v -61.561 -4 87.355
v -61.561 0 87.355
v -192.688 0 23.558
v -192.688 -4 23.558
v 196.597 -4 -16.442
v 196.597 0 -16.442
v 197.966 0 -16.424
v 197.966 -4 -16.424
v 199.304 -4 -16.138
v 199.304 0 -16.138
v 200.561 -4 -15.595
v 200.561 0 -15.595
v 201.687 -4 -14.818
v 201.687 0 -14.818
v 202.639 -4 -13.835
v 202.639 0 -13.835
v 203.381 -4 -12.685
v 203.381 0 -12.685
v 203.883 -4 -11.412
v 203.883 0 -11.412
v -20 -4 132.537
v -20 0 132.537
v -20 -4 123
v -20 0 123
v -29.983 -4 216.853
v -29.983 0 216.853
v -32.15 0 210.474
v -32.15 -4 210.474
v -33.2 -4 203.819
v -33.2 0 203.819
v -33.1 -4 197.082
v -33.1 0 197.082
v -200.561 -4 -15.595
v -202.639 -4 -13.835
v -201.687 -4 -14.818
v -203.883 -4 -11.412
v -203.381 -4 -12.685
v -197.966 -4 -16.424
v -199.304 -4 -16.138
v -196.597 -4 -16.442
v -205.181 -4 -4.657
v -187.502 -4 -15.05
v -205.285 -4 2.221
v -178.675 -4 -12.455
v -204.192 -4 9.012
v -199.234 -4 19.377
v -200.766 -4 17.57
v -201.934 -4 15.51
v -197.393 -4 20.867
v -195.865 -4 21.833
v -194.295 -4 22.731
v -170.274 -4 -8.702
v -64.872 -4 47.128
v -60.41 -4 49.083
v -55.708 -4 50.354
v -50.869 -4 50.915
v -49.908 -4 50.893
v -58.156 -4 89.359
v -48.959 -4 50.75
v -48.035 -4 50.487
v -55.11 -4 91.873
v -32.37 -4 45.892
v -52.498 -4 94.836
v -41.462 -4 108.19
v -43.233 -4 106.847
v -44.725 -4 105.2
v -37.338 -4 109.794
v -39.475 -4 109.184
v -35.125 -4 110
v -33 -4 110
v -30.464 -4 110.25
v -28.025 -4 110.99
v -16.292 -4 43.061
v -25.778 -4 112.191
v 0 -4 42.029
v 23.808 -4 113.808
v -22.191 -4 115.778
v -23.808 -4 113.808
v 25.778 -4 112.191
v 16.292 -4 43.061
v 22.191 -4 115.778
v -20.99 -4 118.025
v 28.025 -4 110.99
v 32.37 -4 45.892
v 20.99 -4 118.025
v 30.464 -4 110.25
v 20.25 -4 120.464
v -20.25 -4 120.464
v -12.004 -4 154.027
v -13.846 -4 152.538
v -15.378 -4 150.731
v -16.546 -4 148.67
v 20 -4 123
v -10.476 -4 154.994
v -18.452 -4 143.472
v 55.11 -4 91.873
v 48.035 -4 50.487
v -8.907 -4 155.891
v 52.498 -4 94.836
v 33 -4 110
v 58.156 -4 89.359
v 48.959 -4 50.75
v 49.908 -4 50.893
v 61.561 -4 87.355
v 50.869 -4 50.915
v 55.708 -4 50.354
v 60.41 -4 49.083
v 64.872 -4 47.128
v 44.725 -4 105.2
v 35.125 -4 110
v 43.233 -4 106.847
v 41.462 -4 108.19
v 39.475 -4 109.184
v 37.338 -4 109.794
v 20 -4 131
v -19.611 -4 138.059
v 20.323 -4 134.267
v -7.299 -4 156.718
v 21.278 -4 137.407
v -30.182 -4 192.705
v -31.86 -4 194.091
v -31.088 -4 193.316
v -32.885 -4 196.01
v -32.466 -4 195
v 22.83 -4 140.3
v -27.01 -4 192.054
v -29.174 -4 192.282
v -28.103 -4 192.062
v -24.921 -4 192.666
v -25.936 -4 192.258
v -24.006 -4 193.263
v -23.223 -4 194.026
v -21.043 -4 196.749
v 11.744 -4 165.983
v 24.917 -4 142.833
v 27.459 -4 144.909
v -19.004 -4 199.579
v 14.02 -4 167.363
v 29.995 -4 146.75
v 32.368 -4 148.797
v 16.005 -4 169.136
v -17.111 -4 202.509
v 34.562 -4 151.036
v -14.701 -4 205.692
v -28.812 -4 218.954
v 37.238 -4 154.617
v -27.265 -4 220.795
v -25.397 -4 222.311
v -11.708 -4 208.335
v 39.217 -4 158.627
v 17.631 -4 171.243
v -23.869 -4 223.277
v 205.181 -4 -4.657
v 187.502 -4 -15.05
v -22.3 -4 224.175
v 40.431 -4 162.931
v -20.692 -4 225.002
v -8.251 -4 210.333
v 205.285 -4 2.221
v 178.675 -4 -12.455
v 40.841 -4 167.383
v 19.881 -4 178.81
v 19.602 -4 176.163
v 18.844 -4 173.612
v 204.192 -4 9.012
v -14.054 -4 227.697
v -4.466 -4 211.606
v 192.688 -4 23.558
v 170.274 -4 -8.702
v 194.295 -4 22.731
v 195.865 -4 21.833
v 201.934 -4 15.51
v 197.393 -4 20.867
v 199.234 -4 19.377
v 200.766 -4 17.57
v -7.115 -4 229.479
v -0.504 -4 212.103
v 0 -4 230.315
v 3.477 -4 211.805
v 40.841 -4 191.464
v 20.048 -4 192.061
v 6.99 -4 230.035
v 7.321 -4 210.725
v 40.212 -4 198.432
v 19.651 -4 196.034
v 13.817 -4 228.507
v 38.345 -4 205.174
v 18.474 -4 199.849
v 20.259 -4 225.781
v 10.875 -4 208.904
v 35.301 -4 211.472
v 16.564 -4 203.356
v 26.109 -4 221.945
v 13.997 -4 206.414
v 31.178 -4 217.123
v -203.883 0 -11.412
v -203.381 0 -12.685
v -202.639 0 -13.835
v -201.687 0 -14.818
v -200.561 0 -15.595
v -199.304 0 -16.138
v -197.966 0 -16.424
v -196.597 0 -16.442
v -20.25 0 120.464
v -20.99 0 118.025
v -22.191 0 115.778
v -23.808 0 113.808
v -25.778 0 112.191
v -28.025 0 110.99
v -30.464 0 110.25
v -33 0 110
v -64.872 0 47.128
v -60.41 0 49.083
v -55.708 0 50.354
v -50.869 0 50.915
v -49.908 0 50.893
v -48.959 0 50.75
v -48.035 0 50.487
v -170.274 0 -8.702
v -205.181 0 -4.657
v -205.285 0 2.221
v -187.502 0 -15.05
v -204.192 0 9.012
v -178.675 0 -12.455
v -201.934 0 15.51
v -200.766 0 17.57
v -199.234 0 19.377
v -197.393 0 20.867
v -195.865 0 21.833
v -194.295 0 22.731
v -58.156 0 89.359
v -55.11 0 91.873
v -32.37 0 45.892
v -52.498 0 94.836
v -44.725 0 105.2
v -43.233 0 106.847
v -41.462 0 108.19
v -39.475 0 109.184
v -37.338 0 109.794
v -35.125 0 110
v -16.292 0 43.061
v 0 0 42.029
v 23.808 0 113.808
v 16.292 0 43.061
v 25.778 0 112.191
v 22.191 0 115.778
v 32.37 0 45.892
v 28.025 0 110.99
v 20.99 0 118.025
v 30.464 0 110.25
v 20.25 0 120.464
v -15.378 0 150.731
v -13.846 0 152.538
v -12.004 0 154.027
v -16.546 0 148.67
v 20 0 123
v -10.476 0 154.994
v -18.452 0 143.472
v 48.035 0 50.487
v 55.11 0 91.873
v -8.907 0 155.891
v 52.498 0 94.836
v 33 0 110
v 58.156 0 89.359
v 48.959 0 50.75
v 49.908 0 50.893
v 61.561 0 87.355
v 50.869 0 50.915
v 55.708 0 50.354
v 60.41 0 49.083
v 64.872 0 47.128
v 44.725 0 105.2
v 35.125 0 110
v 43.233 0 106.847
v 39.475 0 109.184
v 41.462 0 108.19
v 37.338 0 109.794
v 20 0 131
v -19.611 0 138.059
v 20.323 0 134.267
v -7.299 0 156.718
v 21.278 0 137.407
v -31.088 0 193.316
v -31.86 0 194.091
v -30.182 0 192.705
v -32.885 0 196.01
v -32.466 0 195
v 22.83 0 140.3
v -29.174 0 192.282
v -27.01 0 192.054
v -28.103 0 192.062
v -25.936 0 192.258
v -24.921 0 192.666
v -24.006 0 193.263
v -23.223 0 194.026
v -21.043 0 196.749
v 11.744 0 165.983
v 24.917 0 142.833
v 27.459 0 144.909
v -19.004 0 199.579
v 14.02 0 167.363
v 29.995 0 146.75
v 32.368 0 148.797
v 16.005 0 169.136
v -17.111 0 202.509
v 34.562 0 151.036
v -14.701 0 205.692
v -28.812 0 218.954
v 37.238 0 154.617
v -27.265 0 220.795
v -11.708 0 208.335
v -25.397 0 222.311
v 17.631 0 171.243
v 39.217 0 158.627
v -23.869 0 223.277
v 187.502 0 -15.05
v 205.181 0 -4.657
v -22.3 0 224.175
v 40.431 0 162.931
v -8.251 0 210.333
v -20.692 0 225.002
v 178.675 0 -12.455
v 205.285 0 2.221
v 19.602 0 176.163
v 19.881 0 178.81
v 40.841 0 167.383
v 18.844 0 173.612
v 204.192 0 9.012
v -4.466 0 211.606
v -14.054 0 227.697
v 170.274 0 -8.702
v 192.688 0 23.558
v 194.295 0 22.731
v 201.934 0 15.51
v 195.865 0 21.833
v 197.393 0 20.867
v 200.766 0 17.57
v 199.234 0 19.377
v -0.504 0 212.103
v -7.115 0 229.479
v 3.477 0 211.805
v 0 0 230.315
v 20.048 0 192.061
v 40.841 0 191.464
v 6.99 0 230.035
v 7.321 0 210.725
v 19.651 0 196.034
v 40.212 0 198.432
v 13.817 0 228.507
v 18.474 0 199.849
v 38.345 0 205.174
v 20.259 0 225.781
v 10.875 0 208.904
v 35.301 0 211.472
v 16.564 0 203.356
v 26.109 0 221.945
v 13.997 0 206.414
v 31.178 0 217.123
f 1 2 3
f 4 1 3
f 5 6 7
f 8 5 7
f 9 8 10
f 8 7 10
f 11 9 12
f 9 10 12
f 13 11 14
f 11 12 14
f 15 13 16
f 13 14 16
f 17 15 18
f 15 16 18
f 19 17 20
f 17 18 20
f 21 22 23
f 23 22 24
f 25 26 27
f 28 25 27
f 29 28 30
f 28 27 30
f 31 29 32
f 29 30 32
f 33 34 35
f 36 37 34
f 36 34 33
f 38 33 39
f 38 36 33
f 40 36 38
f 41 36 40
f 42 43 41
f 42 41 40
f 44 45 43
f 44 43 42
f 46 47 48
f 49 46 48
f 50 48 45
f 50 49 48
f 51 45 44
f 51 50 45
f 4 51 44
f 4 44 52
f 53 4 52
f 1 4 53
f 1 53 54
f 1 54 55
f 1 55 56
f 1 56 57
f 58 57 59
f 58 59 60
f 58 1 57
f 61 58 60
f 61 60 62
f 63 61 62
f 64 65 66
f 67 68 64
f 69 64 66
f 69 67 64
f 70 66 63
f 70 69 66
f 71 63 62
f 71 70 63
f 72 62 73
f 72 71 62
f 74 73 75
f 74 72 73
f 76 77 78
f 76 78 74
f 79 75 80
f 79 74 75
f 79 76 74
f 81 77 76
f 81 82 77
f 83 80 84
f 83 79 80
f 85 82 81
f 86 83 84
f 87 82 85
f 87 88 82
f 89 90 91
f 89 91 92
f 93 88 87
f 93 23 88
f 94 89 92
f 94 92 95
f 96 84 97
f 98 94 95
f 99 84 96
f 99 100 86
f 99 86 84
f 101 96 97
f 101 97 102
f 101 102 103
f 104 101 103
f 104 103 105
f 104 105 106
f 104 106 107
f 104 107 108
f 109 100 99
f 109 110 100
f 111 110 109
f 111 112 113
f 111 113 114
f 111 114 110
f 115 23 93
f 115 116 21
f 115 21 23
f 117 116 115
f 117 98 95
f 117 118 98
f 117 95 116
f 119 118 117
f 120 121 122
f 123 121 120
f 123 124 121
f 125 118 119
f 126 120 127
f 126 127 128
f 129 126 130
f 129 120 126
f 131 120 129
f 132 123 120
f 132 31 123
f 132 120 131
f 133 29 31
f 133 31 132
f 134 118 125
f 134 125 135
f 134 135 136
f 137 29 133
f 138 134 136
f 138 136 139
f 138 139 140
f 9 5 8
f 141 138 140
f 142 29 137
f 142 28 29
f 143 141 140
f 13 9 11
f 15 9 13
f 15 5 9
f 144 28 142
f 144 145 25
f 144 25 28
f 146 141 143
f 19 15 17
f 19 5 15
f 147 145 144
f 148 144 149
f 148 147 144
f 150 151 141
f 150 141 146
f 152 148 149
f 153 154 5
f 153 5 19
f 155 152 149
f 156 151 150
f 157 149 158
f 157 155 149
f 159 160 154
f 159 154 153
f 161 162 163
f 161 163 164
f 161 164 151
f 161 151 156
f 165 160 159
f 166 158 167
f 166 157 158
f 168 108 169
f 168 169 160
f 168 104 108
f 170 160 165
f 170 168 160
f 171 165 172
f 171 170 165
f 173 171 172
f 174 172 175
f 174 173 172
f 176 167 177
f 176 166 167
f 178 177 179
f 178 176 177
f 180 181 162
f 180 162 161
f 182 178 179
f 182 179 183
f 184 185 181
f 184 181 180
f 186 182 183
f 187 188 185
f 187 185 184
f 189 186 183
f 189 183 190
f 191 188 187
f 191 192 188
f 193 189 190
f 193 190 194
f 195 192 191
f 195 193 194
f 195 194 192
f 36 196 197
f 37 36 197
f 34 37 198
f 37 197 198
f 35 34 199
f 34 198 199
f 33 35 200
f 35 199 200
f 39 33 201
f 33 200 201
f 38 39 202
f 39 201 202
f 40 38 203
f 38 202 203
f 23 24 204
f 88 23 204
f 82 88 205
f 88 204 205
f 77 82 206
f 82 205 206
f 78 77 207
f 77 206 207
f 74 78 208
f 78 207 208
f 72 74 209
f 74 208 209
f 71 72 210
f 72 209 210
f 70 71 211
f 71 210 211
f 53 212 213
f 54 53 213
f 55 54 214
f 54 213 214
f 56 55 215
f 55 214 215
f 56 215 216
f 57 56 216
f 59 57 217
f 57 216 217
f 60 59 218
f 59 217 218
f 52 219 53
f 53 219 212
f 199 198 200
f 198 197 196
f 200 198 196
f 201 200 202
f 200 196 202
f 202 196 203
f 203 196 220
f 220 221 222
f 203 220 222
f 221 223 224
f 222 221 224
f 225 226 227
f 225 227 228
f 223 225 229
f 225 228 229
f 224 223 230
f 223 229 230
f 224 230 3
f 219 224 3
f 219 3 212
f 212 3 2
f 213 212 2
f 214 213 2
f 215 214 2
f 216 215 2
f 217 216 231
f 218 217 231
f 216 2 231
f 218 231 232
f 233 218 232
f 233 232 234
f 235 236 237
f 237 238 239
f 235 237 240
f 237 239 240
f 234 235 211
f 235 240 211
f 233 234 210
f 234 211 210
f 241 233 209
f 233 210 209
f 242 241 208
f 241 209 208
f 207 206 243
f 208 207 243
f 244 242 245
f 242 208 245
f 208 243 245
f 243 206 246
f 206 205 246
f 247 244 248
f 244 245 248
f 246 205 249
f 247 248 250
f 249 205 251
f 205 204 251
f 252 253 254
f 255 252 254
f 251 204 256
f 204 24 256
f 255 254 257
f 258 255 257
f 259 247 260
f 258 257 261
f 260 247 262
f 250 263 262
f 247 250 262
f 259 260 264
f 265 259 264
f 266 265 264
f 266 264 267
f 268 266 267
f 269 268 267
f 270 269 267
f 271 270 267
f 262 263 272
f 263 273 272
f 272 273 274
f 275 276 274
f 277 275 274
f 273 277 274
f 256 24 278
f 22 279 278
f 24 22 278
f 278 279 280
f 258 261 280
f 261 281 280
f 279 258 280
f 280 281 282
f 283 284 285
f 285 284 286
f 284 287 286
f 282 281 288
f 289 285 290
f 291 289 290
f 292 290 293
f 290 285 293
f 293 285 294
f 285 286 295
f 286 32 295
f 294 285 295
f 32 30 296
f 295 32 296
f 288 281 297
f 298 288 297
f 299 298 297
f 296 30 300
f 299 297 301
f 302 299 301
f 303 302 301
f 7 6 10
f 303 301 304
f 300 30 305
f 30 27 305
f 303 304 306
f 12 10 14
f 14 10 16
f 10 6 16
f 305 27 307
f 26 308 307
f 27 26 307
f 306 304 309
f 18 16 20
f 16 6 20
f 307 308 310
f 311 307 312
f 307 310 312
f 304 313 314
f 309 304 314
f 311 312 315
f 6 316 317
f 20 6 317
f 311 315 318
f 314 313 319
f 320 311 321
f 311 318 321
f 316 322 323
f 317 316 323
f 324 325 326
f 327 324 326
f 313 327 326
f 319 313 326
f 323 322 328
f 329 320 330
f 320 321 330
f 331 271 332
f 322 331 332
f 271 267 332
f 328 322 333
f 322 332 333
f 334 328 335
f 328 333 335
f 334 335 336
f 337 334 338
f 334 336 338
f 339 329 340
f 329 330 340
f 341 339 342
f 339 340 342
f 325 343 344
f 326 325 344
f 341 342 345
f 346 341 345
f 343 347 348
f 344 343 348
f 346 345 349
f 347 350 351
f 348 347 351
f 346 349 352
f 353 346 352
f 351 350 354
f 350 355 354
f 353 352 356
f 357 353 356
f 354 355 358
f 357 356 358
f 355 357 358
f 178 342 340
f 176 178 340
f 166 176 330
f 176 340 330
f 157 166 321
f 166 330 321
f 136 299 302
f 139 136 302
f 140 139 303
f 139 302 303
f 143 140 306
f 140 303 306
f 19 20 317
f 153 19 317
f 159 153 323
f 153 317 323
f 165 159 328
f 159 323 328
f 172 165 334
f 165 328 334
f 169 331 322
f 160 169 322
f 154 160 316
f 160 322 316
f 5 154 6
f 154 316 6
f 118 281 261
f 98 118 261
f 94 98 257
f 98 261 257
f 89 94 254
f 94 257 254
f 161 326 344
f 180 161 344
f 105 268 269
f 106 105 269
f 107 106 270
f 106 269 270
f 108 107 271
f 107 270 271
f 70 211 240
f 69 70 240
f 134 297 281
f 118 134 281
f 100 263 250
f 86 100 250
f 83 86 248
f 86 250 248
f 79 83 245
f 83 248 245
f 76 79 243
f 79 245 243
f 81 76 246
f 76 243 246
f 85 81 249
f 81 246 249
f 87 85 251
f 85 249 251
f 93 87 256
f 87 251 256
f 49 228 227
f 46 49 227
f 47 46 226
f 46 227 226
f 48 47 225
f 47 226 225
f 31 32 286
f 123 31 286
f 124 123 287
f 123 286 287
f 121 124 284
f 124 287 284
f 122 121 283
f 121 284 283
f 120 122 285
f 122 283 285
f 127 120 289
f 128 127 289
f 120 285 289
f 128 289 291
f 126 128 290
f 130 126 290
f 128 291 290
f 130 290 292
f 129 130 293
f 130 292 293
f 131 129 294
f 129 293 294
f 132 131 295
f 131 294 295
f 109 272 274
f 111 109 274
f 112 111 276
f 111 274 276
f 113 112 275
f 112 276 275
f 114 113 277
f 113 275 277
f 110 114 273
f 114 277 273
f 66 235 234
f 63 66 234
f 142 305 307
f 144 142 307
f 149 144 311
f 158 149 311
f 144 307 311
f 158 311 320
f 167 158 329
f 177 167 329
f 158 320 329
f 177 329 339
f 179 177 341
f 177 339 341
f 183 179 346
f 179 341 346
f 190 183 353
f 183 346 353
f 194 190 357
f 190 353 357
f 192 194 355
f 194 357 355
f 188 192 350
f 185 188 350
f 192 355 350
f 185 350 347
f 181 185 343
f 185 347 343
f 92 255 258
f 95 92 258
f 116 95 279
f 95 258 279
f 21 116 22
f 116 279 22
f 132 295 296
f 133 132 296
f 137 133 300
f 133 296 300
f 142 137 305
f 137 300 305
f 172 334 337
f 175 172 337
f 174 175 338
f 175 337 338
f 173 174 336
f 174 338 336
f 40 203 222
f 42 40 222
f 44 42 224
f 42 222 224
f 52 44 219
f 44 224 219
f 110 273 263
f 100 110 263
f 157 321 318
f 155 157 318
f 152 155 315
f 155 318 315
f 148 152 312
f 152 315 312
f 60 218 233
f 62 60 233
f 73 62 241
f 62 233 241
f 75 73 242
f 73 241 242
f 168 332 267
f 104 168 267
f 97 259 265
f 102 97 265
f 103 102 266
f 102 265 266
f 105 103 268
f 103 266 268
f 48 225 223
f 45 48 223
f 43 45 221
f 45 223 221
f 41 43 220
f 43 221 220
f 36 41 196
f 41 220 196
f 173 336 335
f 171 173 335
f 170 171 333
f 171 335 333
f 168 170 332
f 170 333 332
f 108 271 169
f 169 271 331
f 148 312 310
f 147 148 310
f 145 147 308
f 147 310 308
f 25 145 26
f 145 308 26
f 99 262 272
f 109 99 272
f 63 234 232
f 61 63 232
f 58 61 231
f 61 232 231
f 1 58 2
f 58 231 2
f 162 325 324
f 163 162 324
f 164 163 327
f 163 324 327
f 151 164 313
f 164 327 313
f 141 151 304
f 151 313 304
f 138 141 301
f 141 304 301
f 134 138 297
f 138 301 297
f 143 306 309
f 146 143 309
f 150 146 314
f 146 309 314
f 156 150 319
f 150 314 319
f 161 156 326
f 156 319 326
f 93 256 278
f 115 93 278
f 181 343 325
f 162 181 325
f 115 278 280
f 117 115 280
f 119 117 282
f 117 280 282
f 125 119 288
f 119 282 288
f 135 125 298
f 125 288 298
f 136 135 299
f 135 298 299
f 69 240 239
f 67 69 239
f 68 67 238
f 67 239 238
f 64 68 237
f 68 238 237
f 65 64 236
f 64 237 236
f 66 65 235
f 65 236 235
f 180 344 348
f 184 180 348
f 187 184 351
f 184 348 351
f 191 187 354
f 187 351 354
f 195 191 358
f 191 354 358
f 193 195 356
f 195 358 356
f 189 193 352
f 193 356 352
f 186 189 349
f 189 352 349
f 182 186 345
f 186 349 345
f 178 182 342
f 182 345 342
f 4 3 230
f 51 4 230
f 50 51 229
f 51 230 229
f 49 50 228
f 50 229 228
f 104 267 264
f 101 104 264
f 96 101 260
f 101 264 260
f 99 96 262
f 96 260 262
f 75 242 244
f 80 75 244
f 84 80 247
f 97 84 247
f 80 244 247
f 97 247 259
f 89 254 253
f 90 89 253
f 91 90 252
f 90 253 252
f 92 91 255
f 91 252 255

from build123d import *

# Parameters (mm, degrees)
F3_DEPTH = 4
F4_DEPTH = 4


with BuildPart() as f3:
    # F1 (on Front) → F3 (new body)
    with BuildSketch(Plane.XZ):
        with BuildLine():
            Line((-44.725054, 105.2), (-52.498164, 94.835853))
            ThreePointArc((-52.498164, 94.835853), (-56.583657, 90.555592), (-61.560664, 87.355393))
            Line((-61.560664, 87.355393), (-192.6875, 23.557777))
            ThreePointArc((-192.6875, 23.557777), (-195.084903, 22.290786), (-197.392505, 20.866785))
            ThreePointArc((-197.392505, 20.866785), (-200.042611, 18.509777), (-201.934068, 15.50962))
            ThreePointArc((-201.934068, 15.50962), (-205.285397, 2.221076), (-203.882736, -11.411582))
            ThreePointArc((-203.882736, -11.411582), (-201.142788, -15.23423), (-196.597382, -16.442223))
            ThreePointArc((-196.597382, -16.442223), (-183.045193, -13.900552), (-170.274075, -8.702432))
            Line((-170.274075, -8.702432), (-64.872076, 47.128487))
            ThreePointArc((-64.872076, 47.128487), (-58.08245, 49.805832), (-50.868805, 50.915129))
            ThreePointArc((-50.868805, 50.915129), (-49.431216, 50.836816), (-48.034631, 50.487038))
            ThreePointArc((-48.034631, 50.487038), (-24.370411, 44.252825), (0, 42.029373))
            ThreePointArc((0, 42.029373), (24.370411, 44.252825), (48.034631, 50.487038))
            ThreePointArc((48.034631, 50.487038), (49.431216, 50.836816), (50.868805, 50.915129))
            ThreePointArc((50.868805, 50.915129), (58.08245, 49.805832), (64.872076, 47.128487))
            Line((64.872076, 47.128487), (170.274075, -8.702432))
            ThreePointArc((170.274075, -8.702432), (183.045193, -13.900552), (196.597382, -16.442223))
            ThreePointArc((196.597382, -16.442223), (201.142788, -15.23423), (203.882736, -11.411582))
            ThreePointArc((203.882736, -11.411582), (205.285397, 2.221076), (201.934068, 15.50962))
            ThreePointArc((201.934068, 15.50962), (200.042611, 18.509777), (197.392505, 20.866785))
            ThreePointArc((197.392505, 20.866785), (195.084903, 22.290786), (192.6875, 23.557777))
            Line((192.6875, 23.557777), (61.560664, 87.355393))
            ThreePointArc((61.560664, 87.355393), (56.583657, 90.555592), (52.498164, 94.835853))
            Line((52.498164, 94.835853), (44.725054, 105.2))
            ThreePointArc((44.725054, 105.2), (40.491617, 108.733126), (35.125054, 110))
            Line((35.125054, 110), (0, 110))
            Line((0, 110), (-35.125054, 110))
            ThreePointArc((-35.125054, 110), (-40.491617, 108.733126), (-44.725054, 105.2))
        make_face()
    extrude(amount=F3_DEPTH)

    # F2 (on Front) → F4 (join)
    with BuildSketch(Plane.XZ):
        with BuildLine():
            ThreePointArc((33, 110), (23.807612, 113.807612), (20, 123))
            Line((20, 123), (20, 131))
            ThreePointArc((20, 131), (21.982577, 138.891463), (27.459489, 144.908875))
            ThreePointArc((27.459489, 144.908875), (31.203117, 147.749038), (34.561641, 151.035616))
            ThreePointArc((34.561641, 151.035616), (39.21699, 158.62718), (40.840753, 167.383179))
            Line((40.840753, 167.383179), (40.840753, 191.46438))
            ThreePointArc((40.840753, 191.46438), (28.75223, 219.648447), (0, 230.31537))
            ThreePointArc((0, 230.31537), (-10.614416, 228.704114), (-20.691802, 225.001649))
            ThreePointArc((-20.691802, 225.001649), (-23.089205, 223.734658), (-25.396808, 222.310657))
            ThreePointArc((-25.396808, 222.310657), (-28.082385, 219.911622), (-29.982966, 216.85295))
            ThreePointArc((-29.982966, 216.85295), (-32.817521, 207.16869), (-33.099611, 197.082064))
            ThreePointArc((-33.099611, 197.082064), (-29.17364, 192.282166), (-23.222911, 194.026042))
            ThreePointArc((-23.222911, 194.026042), (-20.00524, 198.150829), (-17.110942, 202.508616))
            ThreePointArc((-17.110942, 202.508616), (5.426392, 211.361001), (20.048406, 192.060927))
            Line((20.048406, 192.060927), (19.880676, 178.809665))
            ThreePointArc((19.880676, 178.809665), (17.630944, 171.242723), (11.74383, 165.983274))
            Line((11.74383, 165.983274), (-7.299279, 156.718162))
            ThreePointArc((-7.299279, 156.718162), (-9.696682, 155.45117), (-12.004284, 154.027169))
            ThreePointArc((-12.004284, 154.027169), (-14.654389, 151.670161), (-16.545846, 148.670005))
            ThreePointArc((-16.545846, 148.670005), (-19.126786, 140.786151), (-20, 132.536671))
            Line((-20, 132.536671), (-20, 123))
            ThreePointArc((-20, 123), (-23.807612, 113.807612), (-33, 110))
            Line((-33, 110), (33, 110))
        make_face()
    extrude(amount=F4_DEPTH)


solid = f3.part
